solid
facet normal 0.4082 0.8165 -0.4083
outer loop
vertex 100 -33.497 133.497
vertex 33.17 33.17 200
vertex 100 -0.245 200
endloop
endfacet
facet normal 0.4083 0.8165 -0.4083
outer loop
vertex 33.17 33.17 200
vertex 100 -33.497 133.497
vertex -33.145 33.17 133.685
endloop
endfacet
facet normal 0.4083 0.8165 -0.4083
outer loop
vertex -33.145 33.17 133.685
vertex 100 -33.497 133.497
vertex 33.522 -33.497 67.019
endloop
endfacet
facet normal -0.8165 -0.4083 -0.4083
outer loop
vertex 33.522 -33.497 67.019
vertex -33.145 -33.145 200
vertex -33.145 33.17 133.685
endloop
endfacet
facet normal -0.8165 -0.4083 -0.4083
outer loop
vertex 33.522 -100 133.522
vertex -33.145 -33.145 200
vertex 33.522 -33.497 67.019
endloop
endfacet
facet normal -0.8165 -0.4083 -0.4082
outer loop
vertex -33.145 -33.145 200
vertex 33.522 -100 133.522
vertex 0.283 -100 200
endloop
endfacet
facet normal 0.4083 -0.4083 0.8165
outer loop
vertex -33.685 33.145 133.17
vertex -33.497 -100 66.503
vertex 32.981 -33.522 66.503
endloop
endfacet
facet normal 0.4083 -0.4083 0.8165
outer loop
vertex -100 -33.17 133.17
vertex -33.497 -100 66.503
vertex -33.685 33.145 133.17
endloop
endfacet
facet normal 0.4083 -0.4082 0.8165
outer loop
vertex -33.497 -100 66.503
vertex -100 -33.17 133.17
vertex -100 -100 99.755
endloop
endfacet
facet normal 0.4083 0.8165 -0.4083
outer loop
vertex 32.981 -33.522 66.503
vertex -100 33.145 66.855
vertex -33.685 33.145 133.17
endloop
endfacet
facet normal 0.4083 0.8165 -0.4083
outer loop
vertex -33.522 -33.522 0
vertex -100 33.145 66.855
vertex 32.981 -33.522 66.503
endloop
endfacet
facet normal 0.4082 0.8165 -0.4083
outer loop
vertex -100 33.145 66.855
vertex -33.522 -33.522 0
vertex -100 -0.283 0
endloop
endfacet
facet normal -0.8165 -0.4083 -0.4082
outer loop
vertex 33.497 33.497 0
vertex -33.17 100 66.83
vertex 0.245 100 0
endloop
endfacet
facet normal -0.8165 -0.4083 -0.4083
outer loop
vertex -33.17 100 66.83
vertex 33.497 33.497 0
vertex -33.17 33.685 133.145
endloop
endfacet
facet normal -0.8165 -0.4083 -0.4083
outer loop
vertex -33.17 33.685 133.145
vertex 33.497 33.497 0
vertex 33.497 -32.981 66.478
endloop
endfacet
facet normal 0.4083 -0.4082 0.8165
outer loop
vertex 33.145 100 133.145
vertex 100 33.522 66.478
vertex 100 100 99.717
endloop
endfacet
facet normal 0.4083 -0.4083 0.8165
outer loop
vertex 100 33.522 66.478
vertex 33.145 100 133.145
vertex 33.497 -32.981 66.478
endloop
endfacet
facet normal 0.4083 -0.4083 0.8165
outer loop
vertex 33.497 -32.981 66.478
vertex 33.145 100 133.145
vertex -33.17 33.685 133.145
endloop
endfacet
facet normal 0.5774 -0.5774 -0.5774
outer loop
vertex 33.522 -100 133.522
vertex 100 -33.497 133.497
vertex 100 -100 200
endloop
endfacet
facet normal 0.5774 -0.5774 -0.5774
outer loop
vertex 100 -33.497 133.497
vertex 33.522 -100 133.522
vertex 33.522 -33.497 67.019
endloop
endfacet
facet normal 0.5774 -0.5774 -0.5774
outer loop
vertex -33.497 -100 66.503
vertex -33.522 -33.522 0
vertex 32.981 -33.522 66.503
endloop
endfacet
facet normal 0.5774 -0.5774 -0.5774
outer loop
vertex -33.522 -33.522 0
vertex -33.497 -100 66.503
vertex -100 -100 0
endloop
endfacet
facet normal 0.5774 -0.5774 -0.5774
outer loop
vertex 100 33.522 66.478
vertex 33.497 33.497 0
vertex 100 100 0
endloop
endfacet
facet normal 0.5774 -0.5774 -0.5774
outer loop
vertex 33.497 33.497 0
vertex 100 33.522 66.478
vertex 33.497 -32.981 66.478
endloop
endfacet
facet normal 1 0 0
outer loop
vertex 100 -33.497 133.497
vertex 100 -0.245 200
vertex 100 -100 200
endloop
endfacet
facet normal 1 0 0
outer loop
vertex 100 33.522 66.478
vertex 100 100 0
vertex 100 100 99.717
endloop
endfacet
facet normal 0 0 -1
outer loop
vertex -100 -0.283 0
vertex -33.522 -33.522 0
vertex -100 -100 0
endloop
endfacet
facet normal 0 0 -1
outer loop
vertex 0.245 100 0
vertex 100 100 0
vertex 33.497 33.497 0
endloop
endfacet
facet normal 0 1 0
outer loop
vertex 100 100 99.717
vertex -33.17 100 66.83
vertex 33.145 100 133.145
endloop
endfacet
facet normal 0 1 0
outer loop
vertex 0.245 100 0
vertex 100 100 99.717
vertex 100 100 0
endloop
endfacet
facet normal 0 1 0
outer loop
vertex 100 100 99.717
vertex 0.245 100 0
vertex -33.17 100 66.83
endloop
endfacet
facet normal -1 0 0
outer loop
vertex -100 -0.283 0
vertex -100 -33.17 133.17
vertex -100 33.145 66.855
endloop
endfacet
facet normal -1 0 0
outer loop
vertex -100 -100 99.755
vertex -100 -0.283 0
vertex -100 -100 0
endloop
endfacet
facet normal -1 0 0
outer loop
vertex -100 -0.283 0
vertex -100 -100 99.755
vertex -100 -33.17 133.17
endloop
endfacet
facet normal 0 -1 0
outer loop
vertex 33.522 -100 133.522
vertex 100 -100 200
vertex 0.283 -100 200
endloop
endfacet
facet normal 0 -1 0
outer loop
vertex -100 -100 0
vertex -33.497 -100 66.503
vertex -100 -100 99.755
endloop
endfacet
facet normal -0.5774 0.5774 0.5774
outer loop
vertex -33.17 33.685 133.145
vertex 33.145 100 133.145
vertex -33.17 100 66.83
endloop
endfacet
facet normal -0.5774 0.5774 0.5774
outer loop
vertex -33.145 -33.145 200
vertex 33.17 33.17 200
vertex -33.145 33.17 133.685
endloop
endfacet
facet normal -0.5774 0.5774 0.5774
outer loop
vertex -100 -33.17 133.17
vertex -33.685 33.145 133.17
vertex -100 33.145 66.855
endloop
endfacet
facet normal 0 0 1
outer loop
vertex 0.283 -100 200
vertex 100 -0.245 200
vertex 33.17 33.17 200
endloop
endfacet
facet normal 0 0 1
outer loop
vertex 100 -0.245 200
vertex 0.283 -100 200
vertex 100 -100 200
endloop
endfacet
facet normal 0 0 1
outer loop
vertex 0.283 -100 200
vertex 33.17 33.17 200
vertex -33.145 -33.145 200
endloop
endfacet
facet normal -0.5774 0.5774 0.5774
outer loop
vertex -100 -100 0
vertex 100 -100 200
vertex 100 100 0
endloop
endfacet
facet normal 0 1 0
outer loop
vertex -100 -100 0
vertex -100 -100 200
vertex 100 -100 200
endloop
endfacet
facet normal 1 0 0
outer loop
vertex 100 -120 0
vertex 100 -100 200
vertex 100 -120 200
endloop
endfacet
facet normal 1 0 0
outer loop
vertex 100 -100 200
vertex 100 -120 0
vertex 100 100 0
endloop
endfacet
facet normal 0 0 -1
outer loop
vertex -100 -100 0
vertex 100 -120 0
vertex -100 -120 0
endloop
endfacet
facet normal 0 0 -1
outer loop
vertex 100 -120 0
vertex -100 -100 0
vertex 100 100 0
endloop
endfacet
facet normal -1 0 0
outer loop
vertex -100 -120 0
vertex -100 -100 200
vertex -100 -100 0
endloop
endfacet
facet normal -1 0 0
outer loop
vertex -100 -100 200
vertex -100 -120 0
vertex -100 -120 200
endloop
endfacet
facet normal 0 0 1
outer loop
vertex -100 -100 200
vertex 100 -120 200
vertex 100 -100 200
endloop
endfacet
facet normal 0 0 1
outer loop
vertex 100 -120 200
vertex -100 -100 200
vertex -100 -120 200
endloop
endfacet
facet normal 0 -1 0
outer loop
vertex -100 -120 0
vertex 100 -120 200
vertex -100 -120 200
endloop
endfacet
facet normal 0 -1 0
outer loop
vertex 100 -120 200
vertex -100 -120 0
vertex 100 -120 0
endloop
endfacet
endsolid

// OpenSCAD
// 3d model of Matthias Wandel's clever 3-way joint

joint_size = 200;
js = joint_size;
tol = 0.2;
length = 20;

diag = joint_size * sqrt(2);

module cylinder_slice(dia, height, angle, tol=0) {
  difference() {
    cylinder(d=dia, h=height);
    translate([-dia/2-1,-tol,-1]) cube(dia+2);
    translate([0,-2*dia+1,-1]) cube(2*dia);
    rotate(-(90-angle)) translate([-tol/sin(angle),-2*dia+1,-1]) cube(2*dia);
  }
}
/*for (a = [0:2*60:360]) rotate(a) cylinder_slice(50,20,60);*/

module joint_3way() {
  angle = atan(2*js/diag);
  polyhedron(points=[[-js/2, js/2, js/2], [js/2, -js/2, js/2], [-js/2, -js/2, -js/2], [-js/2, -js/2, js/2]], faces=[[0,2,1],[0,1,3],[1,2,3],[0,3,2]]);
  rotate([0,0,-45]) rotate([angle,0,0]) intersection() {
    rotate([-angle,0,0]) rotate([0,0,45]) polyhedron(points=[[-js/2, js/2, js/2], [js/2, -js/2, js/2], [-js/2, -js/2, -js/2], [-js/2, js/2, -js/2], [js/2, -js/2, -js/2], [js/2, js/2, js/2]], faces=[[0,1,2],[3,4,5], [0,5,1], [2, 4, 3], [0,2,3], [1,4,2], [1,5,4], [0,3,5]]);
    rotate(60) for (a = [0:2*60:360]) rotate(a) translate([0,0,-js/2]) cylinder_slice(diag*3/2,js,60, tol);
  }
}
/*joint_3way();*/

module joint_3way_assembled(attached=false) {
  joint_3way();
  rotate([-90,0,0]) rotate(180) joint_3way();
  if ((attached=="perpendicular")||(attached=="right")) {
    translate([0,-(4*js+js)/2,0]) cube([js, 4*js, js], center=true);
    rotate((attached=="right"?0:-90)) translate([0,(4*js+js)/2,0]) cube([js, 4*js, js], center=true);
  }
}
/*joint_3way_assembled();*/
/*joint_3way_assembled("right");*/
/*joint_3way_assembled("perpendicular");*/

module joint_3way_rtp(length) {
  translate([0,0,js/2]) rotate([0,180,0]) {
    joint_3way();
    translate([0,-(length+js)/2,0]) cube([js, length, js], center=true);
  }
}
joint_3way_rtp(length);
